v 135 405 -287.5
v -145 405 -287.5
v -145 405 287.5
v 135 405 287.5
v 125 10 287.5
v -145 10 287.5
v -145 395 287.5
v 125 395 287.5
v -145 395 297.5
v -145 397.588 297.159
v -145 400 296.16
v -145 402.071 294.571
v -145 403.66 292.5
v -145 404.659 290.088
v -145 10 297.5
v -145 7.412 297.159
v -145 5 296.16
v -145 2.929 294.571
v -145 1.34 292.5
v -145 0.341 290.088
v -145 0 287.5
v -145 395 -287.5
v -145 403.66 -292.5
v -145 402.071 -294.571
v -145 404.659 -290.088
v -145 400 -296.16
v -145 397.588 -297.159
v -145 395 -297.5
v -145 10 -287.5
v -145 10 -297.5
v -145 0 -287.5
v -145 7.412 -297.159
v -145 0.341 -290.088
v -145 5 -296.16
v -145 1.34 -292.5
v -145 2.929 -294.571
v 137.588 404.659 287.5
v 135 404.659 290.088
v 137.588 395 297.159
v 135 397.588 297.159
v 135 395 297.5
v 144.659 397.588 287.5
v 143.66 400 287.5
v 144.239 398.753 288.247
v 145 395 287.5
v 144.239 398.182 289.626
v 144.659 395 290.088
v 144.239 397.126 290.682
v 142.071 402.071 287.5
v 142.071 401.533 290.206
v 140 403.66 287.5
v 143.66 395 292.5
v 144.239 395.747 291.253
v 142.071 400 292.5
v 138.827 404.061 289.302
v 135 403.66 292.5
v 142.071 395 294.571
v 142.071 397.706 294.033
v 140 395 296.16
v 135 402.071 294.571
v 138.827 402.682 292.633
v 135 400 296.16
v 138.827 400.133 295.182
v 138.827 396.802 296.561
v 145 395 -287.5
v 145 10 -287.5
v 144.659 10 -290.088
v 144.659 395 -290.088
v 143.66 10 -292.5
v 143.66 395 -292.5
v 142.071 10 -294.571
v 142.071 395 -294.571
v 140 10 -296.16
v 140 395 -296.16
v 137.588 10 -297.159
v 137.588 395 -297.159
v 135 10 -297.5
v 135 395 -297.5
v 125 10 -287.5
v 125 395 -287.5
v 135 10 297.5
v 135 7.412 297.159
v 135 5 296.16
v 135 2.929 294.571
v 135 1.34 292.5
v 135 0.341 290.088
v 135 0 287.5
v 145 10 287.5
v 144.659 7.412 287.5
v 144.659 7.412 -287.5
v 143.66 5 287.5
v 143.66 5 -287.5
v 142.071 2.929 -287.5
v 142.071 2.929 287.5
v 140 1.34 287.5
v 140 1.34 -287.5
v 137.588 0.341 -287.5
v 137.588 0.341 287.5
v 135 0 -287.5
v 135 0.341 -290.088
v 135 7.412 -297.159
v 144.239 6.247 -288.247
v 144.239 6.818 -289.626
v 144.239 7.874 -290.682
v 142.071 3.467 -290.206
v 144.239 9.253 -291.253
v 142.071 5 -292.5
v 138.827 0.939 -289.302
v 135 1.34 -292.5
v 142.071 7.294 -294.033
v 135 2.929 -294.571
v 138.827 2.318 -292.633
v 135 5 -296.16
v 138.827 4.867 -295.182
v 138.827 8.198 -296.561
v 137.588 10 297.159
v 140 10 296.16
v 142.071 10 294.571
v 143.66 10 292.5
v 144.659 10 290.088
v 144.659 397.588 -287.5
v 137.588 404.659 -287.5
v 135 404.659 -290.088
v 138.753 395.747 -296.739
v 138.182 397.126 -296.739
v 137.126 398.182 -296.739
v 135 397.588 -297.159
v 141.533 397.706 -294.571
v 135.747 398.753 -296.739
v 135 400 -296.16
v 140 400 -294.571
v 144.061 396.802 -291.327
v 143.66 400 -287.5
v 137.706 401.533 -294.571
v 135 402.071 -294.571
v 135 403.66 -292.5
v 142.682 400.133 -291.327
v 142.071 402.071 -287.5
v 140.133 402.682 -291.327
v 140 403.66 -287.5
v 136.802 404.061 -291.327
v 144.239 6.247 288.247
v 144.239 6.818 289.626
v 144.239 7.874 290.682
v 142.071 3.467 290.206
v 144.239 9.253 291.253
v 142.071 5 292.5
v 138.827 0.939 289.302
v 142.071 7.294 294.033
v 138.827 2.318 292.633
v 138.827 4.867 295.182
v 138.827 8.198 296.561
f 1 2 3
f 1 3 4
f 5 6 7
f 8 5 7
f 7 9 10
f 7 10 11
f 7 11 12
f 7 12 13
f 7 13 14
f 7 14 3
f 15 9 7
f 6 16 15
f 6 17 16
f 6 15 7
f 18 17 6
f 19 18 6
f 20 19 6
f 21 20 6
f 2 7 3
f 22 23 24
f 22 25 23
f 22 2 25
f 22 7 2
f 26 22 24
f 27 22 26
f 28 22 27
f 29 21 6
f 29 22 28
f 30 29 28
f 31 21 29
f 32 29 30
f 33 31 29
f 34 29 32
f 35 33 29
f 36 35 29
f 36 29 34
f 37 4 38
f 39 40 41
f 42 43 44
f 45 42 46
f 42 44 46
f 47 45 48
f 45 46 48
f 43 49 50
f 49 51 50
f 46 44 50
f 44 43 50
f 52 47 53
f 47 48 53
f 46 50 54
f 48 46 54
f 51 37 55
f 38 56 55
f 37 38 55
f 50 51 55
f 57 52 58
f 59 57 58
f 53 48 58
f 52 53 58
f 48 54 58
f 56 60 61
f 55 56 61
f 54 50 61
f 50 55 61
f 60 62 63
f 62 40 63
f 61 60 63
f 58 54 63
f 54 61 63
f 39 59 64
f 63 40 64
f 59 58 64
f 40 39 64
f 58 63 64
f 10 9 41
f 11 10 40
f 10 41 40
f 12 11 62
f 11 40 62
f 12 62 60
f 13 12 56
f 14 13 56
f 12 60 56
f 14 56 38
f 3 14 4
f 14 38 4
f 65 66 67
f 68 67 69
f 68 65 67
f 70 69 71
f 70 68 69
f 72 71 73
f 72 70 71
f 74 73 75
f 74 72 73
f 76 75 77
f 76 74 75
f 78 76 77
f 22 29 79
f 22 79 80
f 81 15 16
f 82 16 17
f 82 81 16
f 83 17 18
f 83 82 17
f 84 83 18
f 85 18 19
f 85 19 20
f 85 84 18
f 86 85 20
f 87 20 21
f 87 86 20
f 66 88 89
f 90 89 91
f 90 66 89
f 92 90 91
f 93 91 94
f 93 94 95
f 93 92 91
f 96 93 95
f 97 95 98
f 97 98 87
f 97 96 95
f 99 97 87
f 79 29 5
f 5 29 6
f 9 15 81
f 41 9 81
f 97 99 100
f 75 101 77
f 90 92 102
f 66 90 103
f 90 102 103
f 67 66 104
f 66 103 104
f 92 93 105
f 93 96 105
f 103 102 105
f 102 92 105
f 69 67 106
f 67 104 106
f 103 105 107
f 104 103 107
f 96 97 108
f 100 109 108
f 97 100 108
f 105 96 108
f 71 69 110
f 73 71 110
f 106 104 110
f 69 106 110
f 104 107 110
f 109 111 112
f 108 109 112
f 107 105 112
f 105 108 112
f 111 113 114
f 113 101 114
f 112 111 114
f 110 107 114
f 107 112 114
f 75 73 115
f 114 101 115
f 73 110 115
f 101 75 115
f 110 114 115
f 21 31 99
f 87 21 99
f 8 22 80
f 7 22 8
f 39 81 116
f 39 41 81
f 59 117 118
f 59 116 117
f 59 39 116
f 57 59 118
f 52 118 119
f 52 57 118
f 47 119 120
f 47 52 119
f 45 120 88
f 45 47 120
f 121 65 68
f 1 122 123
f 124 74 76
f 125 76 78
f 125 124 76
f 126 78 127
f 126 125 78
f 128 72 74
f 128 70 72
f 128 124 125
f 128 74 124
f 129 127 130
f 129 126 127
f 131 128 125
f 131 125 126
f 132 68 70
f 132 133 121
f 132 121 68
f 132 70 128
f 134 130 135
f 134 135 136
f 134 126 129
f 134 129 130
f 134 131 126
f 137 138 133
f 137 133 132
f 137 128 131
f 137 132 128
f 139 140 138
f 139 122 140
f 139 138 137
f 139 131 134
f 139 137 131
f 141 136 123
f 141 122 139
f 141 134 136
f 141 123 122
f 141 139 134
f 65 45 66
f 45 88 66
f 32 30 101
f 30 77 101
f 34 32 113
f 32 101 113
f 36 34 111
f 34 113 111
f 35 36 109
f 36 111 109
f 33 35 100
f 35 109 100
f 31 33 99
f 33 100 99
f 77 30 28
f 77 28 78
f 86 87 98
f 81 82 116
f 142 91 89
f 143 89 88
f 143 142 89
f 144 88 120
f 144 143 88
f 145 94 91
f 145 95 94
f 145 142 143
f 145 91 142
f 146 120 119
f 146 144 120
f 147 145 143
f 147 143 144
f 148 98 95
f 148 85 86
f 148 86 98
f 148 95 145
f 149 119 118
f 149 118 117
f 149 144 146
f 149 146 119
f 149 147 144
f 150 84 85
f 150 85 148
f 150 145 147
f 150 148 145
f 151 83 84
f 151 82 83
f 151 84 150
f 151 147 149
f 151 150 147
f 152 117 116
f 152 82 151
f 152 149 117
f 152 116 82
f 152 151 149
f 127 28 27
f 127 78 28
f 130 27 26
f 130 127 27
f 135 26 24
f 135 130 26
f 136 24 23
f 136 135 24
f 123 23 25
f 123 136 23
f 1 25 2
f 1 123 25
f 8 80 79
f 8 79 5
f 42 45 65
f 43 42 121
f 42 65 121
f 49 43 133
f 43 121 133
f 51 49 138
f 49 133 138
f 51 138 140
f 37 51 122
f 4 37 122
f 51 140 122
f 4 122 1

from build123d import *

# Parameters (mm, degrees)
SKETCH1_W           = 290
SKETCH1_H           = 595
BOSS_EXTRUDE2_DEPTH = 405
FILLET3_R           = 10
SKETCH3_W           = 575
SKETCH3_H           = 385
CUT_EXTRUDE2_DEPTH  = 270


with BuildPart() as part:
    # Sketch1 → Boss-Extrude2 (new body)
    with BuildSketch(Plane(origin=(0, 0, 0), x_dir=(1, 0, 0), z_dir=(0, 1, 0))):
        Rectangle(SKETCH1_W, SKETCH1_H)
    extrude(amount=BOSS_EXTRUDE2_DEPTH)

    # Fillet3
    fillet3_edges = [part.edges().sort_by_distance(p)[0] for p in [
        (0, 405, 297.5),
        (145, 405, 0),
        (0, 0, 297.5),
        (0, 0, -297.5),
        (145, 0, 0),
        (145, 202.5, 297.5),
        (145, 202.5, -297.5),
        (0, 405, -297.5),
    ]]
    fillet(fillet3_edges, radius=FILLET3_R)

    # Sketch3 → Cut-Extrude2 (cut)
    with BuildSketch(Plane.ZY.offset(145)):
        with Locations((0, 202.5)):
            Rectangle(SKETCH3_W, SKETCH3_H)
    extrude(amount=-CUT_EXTRUDE2_DEPTH, mode=Mode.SUBTRACT)


solid = part.part
